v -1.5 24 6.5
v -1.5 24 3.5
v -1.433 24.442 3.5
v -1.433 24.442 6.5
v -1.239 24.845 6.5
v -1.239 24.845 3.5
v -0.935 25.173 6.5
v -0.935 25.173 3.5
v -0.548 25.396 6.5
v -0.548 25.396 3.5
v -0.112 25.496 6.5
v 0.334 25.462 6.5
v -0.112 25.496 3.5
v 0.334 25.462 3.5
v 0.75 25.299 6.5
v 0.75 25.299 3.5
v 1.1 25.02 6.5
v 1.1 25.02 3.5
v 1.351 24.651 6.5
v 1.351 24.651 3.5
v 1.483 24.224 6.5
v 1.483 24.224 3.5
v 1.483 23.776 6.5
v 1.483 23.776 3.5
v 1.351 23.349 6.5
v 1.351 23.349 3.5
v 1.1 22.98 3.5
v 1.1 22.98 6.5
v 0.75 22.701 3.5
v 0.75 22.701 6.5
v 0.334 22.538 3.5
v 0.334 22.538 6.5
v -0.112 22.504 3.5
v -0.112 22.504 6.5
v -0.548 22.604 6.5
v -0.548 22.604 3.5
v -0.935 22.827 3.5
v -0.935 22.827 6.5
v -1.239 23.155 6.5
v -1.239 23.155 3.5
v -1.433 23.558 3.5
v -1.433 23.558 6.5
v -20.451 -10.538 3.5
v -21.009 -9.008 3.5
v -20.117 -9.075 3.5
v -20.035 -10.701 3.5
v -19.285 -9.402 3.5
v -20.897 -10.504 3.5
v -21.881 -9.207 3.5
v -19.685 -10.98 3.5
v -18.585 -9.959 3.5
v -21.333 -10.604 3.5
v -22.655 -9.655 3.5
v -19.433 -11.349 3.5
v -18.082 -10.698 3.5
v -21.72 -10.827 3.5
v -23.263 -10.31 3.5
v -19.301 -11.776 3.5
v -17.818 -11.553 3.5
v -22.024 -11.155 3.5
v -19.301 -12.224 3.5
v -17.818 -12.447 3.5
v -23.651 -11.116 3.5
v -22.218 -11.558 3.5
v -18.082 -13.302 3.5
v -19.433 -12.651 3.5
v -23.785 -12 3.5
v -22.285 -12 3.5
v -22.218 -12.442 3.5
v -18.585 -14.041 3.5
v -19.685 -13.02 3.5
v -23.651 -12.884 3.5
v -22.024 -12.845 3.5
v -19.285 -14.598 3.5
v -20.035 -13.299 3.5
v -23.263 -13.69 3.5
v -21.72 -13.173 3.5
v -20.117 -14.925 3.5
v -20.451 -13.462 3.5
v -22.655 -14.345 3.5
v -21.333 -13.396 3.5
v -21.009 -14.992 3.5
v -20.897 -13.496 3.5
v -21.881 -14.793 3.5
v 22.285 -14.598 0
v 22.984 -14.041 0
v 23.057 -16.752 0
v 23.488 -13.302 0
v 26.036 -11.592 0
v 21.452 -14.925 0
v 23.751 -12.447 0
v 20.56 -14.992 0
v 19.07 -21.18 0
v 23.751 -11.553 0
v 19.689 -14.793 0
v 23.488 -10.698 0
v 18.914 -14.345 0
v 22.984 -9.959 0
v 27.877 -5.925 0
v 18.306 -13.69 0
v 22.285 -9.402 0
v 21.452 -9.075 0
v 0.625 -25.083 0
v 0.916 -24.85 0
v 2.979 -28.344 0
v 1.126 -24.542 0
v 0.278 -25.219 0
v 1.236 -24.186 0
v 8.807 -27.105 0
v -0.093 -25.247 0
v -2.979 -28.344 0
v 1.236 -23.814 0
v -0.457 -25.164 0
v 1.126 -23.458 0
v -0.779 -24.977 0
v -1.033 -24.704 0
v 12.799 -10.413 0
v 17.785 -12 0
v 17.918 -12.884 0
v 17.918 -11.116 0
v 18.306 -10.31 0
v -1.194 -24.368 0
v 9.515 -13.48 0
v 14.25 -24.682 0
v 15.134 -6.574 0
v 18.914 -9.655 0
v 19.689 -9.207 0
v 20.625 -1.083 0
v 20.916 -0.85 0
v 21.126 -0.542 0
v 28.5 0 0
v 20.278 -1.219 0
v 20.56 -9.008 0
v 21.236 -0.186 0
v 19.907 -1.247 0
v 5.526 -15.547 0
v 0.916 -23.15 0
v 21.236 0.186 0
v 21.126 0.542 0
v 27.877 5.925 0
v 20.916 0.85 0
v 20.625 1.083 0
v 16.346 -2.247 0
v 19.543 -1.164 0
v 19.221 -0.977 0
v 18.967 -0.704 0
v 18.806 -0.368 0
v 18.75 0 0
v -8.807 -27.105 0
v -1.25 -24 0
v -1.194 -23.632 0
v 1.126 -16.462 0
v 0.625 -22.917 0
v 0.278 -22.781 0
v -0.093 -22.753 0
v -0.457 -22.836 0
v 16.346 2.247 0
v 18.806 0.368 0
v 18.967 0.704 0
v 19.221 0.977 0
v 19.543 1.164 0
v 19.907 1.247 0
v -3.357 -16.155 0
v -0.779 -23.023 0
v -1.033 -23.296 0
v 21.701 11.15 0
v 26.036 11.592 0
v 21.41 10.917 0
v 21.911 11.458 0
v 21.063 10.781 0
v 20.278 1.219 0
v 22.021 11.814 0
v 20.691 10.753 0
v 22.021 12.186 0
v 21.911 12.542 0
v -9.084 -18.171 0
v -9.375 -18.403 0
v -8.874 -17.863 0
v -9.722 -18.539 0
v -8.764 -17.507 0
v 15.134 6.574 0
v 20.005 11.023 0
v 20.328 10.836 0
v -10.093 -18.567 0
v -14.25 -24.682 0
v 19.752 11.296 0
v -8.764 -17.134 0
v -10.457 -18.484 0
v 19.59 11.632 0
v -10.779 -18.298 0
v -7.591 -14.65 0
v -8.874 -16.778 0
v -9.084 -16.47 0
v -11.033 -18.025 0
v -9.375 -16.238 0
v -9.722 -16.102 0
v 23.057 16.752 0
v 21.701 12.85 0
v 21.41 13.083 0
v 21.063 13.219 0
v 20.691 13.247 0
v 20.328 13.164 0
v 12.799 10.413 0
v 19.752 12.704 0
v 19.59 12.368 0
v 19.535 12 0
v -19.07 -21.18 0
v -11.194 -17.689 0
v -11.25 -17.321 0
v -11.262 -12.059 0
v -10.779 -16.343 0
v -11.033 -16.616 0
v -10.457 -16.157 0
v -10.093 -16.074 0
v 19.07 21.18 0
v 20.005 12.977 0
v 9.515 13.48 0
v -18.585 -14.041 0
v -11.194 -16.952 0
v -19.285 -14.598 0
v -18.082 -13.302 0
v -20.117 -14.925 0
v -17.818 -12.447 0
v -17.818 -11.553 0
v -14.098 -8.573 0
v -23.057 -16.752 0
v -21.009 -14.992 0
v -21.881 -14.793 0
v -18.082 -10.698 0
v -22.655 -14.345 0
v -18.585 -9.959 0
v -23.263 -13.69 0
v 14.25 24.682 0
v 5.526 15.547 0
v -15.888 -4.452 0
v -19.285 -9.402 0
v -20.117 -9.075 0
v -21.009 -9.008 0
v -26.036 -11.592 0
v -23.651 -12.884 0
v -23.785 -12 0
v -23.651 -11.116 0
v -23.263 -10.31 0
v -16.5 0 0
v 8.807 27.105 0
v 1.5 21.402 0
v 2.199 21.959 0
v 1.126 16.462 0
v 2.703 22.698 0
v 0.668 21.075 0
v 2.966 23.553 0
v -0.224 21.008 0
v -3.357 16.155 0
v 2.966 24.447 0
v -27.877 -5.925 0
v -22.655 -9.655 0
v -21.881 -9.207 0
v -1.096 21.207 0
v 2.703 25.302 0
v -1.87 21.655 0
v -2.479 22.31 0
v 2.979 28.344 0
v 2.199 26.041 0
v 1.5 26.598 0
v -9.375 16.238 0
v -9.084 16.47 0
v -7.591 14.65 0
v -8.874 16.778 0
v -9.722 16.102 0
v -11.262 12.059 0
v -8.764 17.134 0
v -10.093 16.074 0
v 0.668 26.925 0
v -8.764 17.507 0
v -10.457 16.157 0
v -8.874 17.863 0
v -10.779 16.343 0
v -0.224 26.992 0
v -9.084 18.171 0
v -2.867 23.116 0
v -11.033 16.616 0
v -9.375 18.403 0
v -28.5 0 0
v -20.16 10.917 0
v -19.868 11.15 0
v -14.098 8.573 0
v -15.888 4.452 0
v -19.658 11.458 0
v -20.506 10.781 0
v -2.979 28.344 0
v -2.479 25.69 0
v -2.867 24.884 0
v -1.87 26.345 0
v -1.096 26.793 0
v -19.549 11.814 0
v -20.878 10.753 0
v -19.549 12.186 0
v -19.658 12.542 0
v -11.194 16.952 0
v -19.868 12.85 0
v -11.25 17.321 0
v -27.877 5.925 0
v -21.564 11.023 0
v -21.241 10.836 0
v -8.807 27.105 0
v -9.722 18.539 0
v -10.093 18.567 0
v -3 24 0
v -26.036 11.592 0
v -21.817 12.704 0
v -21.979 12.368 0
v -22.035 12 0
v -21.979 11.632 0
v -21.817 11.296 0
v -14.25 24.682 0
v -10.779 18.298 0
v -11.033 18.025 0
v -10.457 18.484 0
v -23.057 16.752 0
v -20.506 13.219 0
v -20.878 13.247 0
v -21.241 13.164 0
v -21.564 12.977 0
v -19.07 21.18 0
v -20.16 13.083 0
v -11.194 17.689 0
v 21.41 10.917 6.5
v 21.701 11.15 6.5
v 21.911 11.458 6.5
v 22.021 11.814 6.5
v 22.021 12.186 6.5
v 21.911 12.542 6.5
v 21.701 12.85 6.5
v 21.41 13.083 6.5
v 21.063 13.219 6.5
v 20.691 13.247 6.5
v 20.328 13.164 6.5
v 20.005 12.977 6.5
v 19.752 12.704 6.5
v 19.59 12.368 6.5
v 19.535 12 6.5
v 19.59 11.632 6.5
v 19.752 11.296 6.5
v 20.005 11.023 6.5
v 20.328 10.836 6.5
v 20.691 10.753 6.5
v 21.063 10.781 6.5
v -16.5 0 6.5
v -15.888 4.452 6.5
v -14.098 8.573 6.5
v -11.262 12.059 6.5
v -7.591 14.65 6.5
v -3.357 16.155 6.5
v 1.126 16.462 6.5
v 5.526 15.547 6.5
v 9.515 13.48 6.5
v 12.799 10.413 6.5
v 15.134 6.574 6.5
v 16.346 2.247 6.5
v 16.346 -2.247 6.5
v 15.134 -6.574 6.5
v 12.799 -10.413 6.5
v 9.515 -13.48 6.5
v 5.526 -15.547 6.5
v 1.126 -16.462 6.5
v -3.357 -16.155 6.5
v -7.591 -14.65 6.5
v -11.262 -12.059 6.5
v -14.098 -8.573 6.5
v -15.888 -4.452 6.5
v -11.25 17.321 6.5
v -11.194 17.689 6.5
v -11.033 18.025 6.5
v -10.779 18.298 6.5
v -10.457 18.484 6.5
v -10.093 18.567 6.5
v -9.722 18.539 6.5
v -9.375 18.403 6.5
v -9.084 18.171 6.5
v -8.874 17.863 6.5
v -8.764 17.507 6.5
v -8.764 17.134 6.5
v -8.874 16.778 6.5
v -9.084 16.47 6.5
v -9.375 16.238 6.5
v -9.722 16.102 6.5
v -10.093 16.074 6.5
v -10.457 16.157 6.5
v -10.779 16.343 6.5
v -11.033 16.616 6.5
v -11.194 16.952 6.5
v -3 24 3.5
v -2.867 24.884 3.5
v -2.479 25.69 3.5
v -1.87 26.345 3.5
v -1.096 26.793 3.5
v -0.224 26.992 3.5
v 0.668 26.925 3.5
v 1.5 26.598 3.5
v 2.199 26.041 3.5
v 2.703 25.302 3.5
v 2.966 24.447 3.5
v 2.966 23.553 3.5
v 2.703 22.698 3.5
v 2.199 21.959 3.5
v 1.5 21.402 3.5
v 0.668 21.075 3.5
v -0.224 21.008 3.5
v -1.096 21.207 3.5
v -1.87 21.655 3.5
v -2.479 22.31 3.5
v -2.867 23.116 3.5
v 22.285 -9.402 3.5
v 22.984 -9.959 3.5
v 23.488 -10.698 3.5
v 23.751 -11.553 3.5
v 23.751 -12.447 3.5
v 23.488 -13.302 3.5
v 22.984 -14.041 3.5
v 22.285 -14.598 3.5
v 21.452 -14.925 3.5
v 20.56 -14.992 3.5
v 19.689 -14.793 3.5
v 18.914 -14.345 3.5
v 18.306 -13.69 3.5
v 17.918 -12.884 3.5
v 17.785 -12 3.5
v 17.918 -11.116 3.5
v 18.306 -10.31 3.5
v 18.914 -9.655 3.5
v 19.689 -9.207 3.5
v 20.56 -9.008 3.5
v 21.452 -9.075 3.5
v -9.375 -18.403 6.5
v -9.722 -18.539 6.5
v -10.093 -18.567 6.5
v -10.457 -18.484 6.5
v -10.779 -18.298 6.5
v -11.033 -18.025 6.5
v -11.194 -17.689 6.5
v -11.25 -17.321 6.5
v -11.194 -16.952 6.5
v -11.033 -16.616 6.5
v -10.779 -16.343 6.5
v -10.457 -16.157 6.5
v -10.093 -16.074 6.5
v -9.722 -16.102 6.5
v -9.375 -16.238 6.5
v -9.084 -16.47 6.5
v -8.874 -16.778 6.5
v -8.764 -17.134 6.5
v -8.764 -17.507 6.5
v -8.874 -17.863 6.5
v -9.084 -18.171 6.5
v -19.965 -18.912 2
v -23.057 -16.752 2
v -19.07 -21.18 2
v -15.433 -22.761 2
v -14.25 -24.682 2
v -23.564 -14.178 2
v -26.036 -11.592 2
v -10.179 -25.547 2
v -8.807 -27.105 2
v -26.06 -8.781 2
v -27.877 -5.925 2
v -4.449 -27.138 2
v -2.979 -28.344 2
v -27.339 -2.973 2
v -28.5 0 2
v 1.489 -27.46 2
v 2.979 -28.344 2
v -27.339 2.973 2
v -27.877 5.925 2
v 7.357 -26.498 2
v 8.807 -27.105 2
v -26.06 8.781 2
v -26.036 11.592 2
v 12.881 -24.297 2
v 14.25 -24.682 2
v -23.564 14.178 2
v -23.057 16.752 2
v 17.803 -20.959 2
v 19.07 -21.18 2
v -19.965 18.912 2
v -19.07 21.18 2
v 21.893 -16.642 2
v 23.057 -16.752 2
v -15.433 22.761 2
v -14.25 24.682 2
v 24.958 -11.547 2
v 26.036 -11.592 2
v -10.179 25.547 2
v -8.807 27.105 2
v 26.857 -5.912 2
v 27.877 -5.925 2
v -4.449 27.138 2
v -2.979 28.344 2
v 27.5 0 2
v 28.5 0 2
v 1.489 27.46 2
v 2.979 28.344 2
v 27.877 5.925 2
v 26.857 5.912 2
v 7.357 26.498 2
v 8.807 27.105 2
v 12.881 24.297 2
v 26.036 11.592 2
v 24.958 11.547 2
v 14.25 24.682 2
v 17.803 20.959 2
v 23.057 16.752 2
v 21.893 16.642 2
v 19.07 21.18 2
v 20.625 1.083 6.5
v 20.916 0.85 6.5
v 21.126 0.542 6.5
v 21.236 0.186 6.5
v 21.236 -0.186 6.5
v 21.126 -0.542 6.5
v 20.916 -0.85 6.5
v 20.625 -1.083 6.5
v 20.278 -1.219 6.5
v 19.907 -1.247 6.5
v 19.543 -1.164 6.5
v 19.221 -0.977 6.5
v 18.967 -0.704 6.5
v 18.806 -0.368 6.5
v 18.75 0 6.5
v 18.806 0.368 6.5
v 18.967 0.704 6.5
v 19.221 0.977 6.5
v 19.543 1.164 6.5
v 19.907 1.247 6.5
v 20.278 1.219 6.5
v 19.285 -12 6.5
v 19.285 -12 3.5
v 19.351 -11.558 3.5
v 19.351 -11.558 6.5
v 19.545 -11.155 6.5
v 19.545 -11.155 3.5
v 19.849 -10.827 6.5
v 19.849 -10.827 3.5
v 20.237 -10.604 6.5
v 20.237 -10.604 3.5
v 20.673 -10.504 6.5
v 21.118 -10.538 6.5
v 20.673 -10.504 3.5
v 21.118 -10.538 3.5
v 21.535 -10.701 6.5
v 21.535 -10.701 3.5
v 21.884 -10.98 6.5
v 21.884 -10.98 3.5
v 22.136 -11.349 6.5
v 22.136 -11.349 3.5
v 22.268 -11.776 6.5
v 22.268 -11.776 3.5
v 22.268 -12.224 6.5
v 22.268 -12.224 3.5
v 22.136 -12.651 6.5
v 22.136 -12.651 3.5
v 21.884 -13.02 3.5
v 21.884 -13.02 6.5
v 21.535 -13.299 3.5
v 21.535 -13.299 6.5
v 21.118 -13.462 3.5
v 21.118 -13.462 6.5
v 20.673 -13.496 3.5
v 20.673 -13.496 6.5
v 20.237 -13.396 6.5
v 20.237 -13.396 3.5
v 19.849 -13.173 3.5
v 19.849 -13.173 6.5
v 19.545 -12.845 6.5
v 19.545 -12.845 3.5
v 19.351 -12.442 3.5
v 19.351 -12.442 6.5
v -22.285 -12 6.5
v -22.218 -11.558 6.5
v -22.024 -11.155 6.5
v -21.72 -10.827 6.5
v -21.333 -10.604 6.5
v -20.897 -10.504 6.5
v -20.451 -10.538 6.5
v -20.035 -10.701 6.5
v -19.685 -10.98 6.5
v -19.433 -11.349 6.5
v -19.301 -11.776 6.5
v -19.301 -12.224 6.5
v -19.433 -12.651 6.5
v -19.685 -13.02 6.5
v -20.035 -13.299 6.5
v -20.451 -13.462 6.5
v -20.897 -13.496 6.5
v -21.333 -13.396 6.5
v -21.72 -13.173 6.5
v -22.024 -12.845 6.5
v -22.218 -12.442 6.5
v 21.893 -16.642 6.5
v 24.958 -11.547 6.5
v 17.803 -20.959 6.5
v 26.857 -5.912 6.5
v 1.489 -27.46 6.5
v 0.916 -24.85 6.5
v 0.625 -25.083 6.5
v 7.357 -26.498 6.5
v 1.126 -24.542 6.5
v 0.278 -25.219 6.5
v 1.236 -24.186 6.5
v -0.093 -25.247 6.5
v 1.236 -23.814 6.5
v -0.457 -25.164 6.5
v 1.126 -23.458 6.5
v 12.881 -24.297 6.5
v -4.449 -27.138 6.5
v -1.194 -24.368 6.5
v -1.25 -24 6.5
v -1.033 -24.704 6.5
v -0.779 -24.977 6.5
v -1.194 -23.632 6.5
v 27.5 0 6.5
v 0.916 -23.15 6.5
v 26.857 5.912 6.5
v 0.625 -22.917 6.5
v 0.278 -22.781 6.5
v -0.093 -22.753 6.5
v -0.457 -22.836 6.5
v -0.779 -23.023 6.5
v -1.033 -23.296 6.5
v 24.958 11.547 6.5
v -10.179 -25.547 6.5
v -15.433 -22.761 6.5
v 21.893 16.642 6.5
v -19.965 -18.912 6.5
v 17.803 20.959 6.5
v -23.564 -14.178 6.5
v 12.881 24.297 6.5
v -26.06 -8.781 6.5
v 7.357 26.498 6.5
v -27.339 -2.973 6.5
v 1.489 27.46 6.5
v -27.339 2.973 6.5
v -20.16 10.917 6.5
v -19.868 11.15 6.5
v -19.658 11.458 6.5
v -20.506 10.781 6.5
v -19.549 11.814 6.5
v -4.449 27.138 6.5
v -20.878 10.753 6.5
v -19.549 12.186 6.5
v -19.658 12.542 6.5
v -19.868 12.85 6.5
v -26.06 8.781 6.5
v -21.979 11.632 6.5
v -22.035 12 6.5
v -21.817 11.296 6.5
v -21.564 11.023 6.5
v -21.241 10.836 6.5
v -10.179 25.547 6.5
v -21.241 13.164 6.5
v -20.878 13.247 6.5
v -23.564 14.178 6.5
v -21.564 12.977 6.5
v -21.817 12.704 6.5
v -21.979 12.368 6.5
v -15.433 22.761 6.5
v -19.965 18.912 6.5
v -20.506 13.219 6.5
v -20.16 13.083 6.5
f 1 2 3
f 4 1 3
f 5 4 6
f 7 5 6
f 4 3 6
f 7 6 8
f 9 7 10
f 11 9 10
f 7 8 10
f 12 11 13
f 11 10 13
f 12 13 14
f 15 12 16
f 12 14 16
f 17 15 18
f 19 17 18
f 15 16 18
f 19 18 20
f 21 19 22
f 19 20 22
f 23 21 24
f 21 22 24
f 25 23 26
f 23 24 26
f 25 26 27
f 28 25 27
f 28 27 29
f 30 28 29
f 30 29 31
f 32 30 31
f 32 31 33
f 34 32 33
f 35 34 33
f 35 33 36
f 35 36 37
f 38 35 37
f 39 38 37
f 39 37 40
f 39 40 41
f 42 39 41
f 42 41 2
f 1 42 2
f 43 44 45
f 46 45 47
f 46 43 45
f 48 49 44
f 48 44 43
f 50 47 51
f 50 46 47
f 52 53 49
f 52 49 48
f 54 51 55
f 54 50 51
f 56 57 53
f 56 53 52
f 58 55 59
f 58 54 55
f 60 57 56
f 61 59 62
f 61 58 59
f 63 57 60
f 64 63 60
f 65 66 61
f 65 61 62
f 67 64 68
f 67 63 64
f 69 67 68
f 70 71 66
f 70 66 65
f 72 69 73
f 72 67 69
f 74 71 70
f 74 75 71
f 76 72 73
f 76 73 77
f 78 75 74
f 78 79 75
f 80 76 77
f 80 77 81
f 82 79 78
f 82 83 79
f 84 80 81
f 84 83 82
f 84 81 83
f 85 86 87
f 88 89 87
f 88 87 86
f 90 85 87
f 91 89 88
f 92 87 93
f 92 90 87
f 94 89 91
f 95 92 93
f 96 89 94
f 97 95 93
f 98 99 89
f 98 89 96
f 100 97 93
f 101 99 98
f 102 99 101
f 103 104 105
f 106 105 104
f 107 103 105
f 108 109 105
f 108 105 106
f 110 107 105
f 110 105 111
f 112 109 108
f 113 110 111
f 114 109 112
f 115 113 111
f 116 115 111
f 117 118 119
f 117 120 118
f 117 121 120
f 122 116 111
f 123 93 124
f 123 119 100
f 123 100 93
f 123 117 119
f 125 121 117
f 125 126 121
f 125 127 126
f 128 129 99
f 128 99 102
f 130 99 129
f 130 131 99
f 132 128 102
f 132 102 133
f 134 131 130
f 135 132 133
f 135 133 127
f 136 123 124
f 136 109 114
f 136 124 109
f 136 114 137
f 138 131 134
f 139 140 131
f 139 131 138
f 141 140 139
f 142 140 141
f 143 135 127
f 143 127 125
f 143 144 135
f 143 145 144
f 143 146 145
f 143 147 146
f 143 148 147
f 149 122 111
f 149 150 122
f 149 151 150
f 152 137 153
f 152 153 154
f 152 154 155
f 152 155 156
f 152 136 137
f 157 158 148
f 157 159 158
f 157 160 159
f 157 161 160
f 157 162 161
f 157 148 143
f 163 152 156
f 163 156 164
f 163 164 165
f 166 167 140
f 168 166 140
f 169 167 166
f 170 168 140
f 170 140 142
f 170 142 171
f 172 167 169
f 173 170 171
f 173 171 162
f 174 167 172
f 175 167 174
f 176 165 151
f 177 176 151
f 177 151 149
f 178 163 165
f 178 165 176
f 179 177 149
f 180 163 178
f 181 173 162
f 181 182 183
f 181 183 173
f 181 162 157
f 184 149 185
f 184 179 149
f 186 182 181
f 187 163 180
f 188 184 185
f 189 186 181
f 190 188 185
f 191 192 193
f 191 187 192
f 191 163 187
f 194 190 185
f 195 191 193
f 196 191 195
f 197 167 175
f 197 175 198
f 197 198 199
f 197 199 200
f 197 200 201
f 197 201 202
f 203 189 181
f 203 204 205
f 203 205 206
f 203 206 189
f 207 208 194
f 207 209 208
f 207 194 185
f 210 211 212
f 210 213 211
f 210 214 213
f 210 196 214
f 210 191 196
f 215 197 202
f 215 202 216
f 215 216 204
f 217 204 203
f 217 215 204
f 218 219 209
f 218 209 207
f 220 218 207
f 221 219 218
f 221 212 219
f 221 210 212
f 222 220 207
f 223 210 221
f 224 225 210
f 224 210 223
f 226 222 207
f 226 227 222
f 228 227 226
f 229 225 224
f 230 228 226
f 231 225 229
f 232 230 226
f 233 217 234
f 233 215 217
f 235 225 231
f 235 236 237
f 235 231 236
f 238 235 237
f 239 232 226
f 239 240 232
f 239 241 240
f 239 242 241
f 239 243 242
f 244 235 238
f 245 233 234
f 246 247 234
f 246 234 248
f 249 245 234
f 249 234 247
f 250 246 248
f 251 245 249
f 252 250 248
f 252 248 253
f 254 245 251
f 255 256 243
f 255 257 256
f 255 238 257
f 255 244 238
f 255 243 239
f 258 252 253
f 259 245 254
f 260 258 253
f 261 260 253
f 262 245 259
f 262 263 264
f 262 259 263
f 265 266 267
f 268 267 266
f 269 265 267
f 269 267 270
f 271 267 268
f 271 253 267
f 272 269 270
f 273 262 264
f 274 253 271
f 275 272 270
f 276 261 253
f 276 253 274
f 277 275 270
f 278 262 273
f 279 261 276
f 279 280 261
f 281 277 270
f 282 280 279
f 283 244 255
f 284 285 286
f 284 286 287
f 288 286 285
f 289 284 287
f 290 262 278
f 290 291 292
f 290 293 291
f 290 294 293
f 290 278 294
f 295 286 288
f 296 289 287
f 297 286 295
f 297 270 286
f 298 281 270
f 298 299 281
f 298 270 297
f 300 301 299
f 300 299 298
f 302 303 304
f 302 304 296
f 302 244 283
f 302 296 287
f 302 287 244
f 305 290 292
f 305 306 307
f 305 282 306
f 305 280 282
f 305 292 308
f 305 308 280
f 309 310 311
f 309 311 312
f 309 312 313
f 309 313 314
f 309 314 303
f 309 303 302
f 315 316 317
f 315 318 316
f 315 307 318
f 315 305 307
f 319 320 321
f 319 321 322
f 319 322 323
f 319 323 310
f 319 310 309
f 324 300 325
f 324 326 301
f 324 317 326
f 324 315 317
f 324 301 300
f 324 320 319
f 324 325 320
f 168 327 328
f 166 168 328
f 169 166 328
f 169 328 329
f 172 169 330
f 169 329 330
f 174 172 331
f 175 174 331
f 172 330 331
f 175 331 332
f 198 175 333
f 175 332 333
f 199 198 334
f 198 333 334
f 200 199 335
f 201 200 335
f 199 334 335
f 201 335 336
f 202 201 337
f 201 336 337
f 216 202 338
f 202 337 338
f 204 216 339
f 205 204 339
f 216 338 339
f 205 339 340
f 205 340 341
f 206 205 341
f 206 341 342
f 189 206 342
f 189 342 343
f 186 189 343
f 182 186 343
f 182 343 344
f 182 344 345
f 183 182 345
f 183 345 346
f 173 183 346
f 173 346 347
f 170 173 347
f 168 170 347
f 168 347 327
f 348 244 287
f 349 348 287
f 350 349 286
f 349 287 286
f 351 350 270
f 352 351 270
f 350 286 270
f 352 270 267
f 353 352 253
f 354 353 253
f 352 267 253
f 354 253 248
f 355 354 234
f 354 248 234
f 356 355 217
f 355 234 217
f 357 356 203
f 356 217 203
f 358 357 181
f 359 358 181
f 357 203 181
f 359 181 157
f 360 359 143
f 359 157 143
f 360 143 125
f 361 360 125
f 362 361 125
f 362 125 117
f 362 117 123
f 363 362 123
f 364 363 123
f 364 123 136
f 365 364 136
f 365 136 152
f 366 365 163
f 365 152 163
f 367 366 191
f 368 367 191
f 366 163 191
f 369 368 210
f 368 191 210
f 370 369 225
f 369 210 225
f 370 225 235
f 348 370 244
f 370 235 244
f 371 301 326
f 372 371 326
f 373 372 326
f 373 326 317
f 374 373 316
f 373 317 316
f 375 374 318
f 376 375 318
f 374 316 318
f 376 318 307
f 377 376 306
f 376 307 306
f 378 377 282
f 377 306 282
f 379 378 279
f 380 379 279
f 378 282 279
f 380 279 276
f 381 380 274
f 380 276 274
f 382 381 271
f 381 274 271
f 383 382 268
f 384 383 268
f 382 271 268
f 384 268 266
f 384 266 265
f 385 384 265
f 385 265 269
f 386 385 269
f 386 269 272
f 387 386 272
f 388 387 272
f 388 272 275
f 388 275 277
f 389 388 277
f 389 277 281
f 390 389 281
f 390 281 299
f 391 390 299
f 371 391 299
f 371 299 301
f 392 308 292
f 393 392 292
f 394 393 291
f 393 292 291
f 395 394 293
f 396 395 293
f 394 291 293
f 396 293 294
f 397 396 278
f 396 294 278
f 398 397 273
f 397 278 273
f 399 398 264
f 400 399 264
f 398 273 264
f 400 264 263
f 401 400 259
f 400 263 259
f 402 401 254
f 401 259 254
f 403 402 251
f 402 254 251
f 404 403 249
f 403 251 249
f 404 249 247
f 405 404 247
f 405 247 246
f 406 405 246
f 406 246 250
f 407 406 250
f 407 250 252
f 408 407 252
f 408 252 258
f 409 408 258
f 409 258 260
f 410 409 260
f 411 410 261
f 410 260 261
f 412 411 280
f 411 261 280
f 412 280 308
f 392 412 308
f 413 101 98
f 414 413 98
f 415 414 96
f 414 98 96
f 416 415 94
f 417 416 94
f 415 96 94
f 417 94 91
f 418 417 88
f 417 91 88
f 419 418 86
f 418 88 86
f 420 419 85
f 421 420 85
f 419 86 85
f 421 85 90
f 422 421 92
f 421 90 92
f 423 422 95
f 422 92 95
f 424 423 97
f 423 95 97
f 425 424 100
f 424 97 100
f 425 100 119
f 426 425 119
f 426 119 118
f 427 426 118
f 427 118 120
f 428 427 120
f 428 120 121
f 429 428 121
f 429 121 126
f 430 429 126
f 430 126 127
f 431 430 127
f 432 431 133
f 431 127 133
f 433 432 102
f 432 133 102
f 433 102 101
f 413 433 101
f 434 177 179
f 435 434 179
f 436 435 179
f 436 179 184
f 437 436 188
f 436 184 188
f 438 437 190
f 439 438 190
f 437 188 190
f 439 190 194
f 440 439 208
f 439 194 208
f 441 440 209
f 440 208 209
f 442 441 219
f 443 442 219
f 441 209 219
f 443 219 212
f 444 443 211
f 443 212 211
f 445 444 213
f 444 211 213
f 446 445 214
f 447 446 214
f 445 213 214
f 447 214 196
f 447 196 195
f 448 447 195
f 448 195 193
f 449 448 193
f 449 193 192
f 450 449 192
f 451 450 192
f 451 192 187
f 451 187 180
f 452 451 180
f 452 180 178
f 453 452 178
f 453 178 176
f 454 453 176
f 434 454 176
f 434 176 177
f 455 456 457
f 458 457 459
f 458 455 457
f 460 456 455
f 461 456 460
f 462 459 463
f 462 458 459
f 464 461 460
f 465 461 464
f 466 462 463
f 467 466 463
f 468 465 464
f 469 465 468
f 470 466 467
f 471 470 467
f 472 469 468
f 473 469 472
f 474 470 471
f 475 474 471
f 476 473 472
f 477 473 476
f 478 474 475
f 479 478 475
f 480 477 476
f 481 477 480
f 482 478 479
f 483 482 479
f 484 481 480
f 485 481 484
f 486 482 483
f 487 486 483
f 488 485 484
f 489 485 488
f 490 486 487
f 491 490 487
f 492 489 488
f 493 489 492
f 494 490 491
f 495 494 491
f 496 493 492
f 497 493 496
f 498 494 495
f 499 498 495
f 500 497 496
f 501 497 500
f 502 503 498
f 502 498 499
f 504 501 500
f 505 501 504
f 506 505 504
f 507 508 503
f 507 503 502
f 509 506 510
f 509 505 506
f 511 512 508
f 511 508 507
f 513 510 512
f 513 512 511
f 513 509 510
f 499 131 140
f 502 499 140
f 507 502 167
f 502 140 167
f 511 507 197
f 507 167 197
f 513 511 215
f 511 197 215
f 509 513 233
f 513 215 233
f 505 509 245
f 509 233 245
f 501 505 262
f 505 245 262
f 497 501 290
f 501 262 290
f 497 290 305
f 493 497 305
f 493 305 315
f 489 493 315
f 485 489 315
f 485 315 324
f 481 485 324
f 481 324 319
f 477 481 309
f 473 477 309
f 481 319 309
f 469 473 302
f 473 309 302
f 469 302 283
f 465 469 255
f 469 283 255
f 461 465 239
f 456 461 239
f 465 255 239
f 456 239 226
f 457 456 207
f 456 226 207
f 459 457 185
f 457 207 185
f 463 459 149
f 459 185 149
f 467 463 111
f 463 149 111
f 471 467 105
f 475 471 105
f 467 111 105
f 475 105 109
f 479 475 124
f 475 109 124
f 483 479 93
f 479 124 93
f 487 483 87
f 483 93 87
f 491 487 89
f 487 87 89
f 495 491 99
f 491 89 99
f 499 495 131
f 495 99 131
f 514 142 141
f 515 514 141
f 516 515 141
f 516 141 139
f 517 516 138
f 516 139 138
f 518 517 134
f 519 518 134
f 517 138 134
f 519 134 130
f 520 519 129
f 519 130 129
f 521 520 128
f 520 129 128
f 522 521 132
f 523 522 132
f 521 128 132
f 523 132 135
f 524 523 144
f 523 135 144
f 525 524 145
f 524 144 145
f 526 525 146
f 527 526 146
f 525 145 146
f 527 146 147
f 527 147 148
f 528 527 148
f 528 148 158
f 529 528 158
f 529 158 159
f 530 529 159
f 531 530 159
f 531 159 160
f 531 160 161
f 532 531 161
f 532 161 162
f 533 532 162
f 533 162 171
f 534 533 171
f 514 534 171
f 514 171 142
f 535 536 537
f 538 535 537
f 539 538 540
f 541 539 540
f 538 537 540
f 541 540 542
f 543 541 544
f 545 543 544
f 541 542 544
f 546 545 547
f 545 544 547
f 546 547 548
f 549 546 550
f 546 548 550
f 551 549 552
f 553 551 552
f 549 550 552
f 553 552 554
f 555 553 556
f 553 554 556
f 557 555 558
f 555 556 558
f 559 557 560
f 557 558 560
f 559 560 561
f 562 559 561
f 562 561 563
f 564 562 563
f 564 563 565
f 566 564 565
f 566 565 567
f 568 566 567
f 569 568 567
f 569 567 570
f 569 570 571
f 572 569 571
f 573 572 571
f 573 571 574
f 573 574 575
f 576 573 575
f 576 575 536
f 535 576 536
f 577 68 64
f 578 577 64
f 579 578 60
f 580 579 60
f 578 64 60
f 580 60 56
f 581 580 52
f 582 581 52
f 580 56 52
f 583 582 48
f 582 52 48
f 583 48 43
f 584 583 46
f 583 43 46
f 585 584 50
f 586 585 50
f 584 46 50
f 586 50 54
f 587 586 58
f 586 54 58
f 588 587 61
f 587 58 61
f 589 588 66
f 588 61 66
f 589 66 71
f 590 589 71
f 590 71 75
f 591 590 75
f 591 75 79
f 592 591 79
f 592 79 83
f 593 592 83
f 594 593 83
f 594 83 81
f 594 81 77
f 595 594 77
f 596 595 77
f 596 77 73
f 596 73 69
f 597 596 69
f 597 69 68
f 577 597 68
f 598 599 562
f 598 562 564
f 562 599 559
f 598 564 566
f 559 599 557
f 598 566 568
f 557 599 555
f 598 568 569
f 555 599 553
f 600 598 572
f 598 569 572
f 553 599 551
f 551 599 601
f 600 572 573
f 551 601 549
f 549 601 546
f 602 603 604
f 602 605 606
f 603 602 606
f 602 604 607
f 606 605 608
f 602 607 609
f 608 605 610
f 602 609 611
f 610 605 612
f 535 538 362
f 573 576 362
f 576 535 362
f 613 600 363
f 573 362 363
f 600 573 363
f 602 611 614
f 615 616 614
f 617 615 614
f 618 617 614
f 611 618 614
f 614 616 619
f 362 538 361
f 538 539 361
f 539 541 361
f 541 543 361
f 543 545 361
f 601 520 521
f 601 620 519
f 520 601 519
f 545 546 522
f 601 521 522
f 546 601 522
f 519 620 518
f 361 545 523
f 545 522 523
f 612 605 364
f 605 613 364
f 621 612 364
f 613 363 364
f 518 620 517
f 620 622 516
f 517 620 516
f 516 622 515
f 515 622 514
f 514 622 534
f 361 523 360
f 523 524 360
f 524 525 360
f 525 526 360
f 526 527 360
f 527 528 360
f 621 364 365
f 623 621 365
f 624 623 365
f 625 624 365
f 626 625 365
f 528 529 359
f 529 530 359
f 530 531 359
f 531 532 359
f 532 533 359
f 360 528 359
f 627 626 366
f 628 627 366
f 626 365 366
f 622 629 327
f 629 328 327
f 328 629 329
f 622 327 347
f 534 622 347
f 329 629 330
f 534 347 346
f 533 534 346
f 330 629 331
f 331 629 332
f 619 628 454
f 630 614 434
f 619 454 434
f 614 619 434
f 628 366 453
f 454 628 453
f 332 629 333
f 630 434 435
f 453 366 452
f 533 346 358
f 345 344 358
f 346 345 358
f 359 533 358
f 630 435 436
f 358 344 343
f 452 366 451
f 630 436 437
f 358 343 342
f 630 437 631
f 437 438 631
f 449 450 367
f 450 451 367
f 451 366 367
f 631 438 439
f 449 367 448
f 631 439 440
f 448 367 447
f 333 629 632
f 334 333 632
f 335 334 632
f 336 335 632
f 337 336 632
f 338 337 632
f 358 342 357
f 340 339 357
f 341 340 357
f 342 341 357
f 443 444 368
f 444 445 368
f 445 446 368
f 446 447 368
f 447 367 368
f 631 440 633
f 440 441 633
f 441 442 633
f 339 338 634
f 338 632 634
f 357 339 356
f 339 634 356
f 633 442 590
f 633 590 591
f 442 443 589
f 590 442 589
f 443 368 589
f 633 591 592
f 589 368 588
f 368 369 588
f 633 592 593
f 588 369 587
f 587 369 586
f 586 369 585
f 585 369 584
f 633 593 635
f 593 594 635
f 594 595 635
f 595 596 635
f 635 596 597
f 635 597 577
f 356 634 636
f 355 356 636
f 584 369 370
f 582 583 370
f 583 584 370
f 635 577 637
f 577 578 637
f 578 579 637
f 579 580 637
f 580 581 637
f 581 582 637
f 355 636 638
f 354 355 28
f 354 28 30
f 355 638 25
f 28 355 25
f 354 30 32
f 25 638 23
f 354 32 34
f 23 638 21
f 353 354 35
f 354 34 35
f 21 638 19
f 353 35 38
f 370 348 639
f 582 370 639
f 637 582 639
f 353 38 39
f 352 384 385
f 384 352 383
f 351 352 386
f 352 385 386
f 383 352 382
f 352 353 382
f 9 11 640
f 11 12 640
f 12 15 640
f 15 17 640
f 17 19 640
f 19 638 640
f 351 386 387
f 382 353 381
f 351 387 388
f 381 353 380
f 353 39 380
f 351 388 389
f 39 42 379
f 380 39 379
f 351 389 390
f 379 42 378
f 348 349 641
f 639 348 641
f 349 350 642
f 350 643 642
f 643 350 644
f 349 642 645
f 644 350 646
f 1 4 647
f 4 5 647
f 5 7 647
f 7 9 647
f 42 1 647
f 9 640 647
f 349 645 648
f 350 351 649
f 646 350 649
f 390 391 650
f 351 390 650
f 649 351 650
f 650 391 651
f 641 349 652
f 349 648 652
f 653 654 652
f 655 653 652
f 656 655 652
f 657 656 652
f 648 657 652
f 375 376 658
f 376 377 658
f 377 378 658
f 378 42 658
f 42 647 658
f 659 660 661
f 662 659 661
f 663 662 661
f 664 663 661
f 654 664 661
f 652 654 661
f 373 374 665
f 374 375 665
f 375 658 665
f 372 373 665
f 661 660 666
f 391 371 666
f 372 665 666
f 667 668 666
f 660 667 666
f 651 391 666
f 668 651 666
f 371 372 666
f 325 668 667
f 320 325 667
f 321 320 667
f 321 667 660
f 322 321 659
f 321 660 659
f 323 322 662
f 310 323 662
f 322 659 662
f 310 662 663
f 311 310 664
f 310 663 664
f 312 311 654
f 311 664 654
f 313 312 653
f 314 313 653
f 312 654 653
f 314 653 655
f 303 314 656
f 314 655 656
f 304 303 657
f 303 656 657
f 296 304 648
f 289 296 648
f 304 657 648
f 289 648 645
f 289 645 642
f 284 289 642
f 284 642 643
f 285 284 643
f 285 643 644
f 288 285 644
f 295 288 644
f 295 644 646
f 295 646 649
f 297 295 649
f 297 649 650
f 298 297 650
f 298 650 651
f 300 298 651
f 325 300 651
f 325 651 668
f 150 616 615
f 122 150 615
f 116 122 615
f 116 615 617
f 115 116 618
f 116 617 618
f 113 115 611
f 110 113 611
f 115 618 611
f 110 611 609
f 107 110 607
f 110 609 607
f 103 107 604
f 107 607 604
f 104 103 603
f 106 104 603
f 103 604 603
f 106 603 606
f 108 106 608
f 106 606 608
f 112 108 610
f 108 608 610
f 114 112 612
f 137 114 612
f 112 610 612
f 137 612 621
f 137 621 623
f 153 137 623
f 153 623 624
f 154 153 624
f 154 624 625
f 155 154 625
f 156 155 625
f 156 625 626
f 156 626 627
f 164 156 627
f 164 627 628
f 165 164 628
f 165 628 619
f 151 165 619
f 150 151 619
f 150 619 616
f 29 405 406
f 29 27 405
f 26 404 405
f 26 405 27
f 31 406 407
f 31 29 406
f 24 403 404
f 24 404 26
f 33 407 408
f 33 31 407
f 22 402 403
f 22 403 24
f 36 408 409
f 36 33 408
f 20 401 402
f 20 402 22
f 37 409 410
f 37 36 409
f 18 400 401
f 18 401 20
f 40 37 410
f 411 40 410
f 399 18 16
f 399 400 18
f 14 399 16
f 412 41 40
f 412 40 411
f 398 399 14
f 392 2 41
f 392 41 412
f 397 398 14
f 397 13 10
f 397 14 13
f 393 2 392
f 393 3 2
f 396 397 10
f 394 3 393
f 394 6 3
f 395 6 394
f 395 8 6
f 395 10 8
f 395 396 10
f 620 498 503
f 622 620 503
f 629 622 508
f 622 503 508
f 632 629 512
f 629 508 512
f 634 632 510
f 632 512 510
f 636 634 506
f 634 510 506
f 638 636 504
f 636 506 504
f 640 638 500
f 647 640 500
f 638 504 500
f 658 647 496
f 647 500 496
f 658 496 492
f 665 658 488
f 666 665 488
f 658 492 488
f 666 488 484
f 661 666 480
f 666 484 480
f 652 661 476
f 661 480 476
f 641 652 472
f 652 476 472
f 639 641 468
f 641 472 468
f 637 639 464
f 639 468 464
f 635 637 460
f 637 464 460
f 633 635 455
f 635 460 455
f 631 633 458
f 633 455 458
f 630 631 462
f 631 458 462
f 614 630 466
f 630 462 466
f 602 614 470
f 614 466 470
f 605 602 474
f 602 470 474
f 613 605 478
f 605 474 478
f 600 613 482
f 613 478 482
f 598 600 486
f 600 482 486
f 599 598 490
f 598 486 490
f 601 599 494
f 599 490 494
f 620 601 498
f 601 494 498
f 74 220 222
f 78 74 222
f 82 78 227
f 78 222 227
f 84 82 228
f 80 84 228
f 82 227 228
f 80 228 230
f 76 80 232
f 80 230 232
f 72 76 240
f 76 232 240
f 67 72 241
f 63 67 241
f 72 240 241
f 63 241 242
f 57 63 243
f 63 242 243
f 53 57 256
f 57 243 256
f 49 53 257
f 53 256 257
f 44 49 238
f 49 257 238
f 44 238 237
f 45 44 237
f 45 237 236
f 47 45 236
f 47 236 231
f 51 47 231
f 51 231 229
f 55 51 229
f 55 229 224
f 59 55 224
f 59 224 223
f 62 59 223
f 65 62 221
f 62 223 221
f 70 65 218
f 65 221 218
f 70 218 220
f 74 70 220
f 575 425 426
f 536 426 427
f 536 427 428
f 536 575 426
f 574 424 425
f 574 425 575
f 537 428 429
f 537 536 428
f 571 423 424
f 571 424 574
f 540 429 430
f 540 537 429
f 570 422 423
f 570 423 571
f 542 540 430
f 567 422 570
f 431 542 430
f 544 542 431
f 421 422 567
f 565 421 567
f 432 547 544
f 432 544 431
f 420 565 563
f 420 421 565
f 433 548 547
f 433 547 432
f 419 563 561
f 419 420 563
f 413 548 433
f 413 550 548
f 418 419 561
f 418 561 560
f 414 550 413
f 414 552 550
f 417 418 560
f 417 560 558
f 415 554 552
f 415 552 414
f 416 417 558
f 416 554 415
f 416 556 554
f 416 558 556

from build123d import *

# Parameters (mm, degrees)
SKETCH1_R           = 28.5
SKETCH1_R_2         = 19.5
BOSS_EXTRUDE1_DEPTH = 2
SKETCH2_R           = 27.5
SKETCH2_R_2         = 19.5
BOSS_EXTRUDE2_DEPTH = 4.5
SKETCH3_R           = 1.25
CUT_EXTRUDE1_DEPTH  = 41.825849654
CIRPATTERN1_COUNT   = 6
SKETCH5_R           = 19.5
SKETCH5_R_2         = 16.5
BOSS_EXTRUDE3_DEPTH = 6.5
SKETCH6_R           = 1.25
CUT_EXTRUDE2_DEPTH  = 10
CIRPATTERN2_COUNT   = 3
SKETCH8_R           = 3
CUT_EXTRUDE4_DEPTH  = 3.5
CIRPATTERN4_COUNT   = 3
SKETCH9_R           = 1.5
CUT_EXTRUDE5_DEPTH  = 41.456767048


with BuildPart() as part:
    # Sketch1 → Boss-Extrude1 (new body)
    with BuildSketch(Plane.XY):
        Circle(SKETCH1_R)
        Circle(SKETCH1_R_2, mode=Mode.SUBTRACT)
    extrude(amount=BOSS_EXTRUDE1_DEPTH)

    # Sketch2 → Boss-Extrude2 (add)
    with BuildSketch(Plane.XY.offset(2)):
        Circle(SKETCH2_R)
        Circle(SKETCH2_R_2, mode=Mode.SUBTRACT)
    extrude(amount=BOSS_EXTRUDE2_DEPTH)

    # Sketch3 → Cut-Extrude1 (cut, through all)
    with BuildSketch(Plane.XY.offset(6.5)):
        with Locations((0, 24)):
            Circle(SKETCH3_R)
    cut_extrude1 = extrude(amount=-CUT_EXTRUDE1_DEPTH, mode=Mode.SUBTRACT)

    # CirPattern1: Cut-Extrude1 ×6 about axis
    cirpattern1_axis = Axis((0, 0, 0), (0, 0, 1))
    for i in range(1, CIRPATTERN1_COUNT):
        add(cut_extrude1.rotate(cirpattern1_axis, i * 360 / CIRPATTERN1_COUNT), mode=Mode.SUBTRACT)

    # Sketch5 → Boss-Extrude3 (add)
    with BuildSketch(Plane(origin=(0, 0, 0), x_dir=(-1, 0, 0), z_dir=(0, 0, -1))):
        Circle(SKETCH5_R)
        Circle(SKETCH5_R_2, mode=Mode.SUBTRACT)
    extrude(amount=-BOSS_EXTRUDE3_DEPTH)

    # Sketch6 → Cut-Extrude2 (cut)
    with BuildSketch(Plane(origin=(0, 0, 0), x_dir=(-1, 0, 0), z_dir=(0, 0, -1))):
        with Locations((10, 17.320508076)):
            Circle(SKETCH6_R)
    cut_extrude2 = extrude(amount=-CUT_EXTRUDE2_DEPTH, mode=Mode.SUBTRACT)

    # CirPattern2: Cut-Extrude2 ×3 about axis
    cirpattern2_axis = Axis((0, 0, 0), (0, 0, 1))
    for i in range(1, CIRPATTERN2_COUNT):
        add(cut_extrude2.rotate(cirpattern2_axis, i * 360 / CIRPATTERN2_COUNT), mode=Mode.SUBTRACT)

    # Sketch8 → Cut-Extrude4 (cut)
    with BuildSketch(Plane(origin=(0, 0, 0), x_dir=(-1, 0, 0), z_dir=(0, 0, -1))):
        with Locations((0, 24)):
            Circle(SKETCH8_R)
    cut_extrude4 = extrude(amount=-CUT_EXTRUDE4_DEPTH, mode=Mode.SUBTRACT)

    # CirPattern4: Cut-Extrude4 ×3 about axis
    cirpattern4_axis = Axis((0, 0, 0), (0, 0, 1))
    for i in range(1, CIRPATTERN4_COUNT):
        add(cut_extrude4.rotate(cirpattern4_axis, i * 360 / CIRPATTERN4_COUNT), mode=Mode.SUBTRACT)

    # Sketch9 → Cut-Extrude5 (cut, through all)
    with BuildSketch(Plane(origin=(0, 0, 3.5), x_dir=(-1, 0, 0), z_dir=(0, 0, -1))):
        with Locations((0, 24)):
            Circle(SKETCH9_R)
        with Locations((20.784609691, -12)):
            Circle(SKETCH9_R)
        with Locations((-20.784609691, -12)):
            Circle(SKETCH9_R)
    extrude(amount=-CUT_EXTRUDE5_DEPTH, mode=Mode.SUBTRACT)


solid = part.part
